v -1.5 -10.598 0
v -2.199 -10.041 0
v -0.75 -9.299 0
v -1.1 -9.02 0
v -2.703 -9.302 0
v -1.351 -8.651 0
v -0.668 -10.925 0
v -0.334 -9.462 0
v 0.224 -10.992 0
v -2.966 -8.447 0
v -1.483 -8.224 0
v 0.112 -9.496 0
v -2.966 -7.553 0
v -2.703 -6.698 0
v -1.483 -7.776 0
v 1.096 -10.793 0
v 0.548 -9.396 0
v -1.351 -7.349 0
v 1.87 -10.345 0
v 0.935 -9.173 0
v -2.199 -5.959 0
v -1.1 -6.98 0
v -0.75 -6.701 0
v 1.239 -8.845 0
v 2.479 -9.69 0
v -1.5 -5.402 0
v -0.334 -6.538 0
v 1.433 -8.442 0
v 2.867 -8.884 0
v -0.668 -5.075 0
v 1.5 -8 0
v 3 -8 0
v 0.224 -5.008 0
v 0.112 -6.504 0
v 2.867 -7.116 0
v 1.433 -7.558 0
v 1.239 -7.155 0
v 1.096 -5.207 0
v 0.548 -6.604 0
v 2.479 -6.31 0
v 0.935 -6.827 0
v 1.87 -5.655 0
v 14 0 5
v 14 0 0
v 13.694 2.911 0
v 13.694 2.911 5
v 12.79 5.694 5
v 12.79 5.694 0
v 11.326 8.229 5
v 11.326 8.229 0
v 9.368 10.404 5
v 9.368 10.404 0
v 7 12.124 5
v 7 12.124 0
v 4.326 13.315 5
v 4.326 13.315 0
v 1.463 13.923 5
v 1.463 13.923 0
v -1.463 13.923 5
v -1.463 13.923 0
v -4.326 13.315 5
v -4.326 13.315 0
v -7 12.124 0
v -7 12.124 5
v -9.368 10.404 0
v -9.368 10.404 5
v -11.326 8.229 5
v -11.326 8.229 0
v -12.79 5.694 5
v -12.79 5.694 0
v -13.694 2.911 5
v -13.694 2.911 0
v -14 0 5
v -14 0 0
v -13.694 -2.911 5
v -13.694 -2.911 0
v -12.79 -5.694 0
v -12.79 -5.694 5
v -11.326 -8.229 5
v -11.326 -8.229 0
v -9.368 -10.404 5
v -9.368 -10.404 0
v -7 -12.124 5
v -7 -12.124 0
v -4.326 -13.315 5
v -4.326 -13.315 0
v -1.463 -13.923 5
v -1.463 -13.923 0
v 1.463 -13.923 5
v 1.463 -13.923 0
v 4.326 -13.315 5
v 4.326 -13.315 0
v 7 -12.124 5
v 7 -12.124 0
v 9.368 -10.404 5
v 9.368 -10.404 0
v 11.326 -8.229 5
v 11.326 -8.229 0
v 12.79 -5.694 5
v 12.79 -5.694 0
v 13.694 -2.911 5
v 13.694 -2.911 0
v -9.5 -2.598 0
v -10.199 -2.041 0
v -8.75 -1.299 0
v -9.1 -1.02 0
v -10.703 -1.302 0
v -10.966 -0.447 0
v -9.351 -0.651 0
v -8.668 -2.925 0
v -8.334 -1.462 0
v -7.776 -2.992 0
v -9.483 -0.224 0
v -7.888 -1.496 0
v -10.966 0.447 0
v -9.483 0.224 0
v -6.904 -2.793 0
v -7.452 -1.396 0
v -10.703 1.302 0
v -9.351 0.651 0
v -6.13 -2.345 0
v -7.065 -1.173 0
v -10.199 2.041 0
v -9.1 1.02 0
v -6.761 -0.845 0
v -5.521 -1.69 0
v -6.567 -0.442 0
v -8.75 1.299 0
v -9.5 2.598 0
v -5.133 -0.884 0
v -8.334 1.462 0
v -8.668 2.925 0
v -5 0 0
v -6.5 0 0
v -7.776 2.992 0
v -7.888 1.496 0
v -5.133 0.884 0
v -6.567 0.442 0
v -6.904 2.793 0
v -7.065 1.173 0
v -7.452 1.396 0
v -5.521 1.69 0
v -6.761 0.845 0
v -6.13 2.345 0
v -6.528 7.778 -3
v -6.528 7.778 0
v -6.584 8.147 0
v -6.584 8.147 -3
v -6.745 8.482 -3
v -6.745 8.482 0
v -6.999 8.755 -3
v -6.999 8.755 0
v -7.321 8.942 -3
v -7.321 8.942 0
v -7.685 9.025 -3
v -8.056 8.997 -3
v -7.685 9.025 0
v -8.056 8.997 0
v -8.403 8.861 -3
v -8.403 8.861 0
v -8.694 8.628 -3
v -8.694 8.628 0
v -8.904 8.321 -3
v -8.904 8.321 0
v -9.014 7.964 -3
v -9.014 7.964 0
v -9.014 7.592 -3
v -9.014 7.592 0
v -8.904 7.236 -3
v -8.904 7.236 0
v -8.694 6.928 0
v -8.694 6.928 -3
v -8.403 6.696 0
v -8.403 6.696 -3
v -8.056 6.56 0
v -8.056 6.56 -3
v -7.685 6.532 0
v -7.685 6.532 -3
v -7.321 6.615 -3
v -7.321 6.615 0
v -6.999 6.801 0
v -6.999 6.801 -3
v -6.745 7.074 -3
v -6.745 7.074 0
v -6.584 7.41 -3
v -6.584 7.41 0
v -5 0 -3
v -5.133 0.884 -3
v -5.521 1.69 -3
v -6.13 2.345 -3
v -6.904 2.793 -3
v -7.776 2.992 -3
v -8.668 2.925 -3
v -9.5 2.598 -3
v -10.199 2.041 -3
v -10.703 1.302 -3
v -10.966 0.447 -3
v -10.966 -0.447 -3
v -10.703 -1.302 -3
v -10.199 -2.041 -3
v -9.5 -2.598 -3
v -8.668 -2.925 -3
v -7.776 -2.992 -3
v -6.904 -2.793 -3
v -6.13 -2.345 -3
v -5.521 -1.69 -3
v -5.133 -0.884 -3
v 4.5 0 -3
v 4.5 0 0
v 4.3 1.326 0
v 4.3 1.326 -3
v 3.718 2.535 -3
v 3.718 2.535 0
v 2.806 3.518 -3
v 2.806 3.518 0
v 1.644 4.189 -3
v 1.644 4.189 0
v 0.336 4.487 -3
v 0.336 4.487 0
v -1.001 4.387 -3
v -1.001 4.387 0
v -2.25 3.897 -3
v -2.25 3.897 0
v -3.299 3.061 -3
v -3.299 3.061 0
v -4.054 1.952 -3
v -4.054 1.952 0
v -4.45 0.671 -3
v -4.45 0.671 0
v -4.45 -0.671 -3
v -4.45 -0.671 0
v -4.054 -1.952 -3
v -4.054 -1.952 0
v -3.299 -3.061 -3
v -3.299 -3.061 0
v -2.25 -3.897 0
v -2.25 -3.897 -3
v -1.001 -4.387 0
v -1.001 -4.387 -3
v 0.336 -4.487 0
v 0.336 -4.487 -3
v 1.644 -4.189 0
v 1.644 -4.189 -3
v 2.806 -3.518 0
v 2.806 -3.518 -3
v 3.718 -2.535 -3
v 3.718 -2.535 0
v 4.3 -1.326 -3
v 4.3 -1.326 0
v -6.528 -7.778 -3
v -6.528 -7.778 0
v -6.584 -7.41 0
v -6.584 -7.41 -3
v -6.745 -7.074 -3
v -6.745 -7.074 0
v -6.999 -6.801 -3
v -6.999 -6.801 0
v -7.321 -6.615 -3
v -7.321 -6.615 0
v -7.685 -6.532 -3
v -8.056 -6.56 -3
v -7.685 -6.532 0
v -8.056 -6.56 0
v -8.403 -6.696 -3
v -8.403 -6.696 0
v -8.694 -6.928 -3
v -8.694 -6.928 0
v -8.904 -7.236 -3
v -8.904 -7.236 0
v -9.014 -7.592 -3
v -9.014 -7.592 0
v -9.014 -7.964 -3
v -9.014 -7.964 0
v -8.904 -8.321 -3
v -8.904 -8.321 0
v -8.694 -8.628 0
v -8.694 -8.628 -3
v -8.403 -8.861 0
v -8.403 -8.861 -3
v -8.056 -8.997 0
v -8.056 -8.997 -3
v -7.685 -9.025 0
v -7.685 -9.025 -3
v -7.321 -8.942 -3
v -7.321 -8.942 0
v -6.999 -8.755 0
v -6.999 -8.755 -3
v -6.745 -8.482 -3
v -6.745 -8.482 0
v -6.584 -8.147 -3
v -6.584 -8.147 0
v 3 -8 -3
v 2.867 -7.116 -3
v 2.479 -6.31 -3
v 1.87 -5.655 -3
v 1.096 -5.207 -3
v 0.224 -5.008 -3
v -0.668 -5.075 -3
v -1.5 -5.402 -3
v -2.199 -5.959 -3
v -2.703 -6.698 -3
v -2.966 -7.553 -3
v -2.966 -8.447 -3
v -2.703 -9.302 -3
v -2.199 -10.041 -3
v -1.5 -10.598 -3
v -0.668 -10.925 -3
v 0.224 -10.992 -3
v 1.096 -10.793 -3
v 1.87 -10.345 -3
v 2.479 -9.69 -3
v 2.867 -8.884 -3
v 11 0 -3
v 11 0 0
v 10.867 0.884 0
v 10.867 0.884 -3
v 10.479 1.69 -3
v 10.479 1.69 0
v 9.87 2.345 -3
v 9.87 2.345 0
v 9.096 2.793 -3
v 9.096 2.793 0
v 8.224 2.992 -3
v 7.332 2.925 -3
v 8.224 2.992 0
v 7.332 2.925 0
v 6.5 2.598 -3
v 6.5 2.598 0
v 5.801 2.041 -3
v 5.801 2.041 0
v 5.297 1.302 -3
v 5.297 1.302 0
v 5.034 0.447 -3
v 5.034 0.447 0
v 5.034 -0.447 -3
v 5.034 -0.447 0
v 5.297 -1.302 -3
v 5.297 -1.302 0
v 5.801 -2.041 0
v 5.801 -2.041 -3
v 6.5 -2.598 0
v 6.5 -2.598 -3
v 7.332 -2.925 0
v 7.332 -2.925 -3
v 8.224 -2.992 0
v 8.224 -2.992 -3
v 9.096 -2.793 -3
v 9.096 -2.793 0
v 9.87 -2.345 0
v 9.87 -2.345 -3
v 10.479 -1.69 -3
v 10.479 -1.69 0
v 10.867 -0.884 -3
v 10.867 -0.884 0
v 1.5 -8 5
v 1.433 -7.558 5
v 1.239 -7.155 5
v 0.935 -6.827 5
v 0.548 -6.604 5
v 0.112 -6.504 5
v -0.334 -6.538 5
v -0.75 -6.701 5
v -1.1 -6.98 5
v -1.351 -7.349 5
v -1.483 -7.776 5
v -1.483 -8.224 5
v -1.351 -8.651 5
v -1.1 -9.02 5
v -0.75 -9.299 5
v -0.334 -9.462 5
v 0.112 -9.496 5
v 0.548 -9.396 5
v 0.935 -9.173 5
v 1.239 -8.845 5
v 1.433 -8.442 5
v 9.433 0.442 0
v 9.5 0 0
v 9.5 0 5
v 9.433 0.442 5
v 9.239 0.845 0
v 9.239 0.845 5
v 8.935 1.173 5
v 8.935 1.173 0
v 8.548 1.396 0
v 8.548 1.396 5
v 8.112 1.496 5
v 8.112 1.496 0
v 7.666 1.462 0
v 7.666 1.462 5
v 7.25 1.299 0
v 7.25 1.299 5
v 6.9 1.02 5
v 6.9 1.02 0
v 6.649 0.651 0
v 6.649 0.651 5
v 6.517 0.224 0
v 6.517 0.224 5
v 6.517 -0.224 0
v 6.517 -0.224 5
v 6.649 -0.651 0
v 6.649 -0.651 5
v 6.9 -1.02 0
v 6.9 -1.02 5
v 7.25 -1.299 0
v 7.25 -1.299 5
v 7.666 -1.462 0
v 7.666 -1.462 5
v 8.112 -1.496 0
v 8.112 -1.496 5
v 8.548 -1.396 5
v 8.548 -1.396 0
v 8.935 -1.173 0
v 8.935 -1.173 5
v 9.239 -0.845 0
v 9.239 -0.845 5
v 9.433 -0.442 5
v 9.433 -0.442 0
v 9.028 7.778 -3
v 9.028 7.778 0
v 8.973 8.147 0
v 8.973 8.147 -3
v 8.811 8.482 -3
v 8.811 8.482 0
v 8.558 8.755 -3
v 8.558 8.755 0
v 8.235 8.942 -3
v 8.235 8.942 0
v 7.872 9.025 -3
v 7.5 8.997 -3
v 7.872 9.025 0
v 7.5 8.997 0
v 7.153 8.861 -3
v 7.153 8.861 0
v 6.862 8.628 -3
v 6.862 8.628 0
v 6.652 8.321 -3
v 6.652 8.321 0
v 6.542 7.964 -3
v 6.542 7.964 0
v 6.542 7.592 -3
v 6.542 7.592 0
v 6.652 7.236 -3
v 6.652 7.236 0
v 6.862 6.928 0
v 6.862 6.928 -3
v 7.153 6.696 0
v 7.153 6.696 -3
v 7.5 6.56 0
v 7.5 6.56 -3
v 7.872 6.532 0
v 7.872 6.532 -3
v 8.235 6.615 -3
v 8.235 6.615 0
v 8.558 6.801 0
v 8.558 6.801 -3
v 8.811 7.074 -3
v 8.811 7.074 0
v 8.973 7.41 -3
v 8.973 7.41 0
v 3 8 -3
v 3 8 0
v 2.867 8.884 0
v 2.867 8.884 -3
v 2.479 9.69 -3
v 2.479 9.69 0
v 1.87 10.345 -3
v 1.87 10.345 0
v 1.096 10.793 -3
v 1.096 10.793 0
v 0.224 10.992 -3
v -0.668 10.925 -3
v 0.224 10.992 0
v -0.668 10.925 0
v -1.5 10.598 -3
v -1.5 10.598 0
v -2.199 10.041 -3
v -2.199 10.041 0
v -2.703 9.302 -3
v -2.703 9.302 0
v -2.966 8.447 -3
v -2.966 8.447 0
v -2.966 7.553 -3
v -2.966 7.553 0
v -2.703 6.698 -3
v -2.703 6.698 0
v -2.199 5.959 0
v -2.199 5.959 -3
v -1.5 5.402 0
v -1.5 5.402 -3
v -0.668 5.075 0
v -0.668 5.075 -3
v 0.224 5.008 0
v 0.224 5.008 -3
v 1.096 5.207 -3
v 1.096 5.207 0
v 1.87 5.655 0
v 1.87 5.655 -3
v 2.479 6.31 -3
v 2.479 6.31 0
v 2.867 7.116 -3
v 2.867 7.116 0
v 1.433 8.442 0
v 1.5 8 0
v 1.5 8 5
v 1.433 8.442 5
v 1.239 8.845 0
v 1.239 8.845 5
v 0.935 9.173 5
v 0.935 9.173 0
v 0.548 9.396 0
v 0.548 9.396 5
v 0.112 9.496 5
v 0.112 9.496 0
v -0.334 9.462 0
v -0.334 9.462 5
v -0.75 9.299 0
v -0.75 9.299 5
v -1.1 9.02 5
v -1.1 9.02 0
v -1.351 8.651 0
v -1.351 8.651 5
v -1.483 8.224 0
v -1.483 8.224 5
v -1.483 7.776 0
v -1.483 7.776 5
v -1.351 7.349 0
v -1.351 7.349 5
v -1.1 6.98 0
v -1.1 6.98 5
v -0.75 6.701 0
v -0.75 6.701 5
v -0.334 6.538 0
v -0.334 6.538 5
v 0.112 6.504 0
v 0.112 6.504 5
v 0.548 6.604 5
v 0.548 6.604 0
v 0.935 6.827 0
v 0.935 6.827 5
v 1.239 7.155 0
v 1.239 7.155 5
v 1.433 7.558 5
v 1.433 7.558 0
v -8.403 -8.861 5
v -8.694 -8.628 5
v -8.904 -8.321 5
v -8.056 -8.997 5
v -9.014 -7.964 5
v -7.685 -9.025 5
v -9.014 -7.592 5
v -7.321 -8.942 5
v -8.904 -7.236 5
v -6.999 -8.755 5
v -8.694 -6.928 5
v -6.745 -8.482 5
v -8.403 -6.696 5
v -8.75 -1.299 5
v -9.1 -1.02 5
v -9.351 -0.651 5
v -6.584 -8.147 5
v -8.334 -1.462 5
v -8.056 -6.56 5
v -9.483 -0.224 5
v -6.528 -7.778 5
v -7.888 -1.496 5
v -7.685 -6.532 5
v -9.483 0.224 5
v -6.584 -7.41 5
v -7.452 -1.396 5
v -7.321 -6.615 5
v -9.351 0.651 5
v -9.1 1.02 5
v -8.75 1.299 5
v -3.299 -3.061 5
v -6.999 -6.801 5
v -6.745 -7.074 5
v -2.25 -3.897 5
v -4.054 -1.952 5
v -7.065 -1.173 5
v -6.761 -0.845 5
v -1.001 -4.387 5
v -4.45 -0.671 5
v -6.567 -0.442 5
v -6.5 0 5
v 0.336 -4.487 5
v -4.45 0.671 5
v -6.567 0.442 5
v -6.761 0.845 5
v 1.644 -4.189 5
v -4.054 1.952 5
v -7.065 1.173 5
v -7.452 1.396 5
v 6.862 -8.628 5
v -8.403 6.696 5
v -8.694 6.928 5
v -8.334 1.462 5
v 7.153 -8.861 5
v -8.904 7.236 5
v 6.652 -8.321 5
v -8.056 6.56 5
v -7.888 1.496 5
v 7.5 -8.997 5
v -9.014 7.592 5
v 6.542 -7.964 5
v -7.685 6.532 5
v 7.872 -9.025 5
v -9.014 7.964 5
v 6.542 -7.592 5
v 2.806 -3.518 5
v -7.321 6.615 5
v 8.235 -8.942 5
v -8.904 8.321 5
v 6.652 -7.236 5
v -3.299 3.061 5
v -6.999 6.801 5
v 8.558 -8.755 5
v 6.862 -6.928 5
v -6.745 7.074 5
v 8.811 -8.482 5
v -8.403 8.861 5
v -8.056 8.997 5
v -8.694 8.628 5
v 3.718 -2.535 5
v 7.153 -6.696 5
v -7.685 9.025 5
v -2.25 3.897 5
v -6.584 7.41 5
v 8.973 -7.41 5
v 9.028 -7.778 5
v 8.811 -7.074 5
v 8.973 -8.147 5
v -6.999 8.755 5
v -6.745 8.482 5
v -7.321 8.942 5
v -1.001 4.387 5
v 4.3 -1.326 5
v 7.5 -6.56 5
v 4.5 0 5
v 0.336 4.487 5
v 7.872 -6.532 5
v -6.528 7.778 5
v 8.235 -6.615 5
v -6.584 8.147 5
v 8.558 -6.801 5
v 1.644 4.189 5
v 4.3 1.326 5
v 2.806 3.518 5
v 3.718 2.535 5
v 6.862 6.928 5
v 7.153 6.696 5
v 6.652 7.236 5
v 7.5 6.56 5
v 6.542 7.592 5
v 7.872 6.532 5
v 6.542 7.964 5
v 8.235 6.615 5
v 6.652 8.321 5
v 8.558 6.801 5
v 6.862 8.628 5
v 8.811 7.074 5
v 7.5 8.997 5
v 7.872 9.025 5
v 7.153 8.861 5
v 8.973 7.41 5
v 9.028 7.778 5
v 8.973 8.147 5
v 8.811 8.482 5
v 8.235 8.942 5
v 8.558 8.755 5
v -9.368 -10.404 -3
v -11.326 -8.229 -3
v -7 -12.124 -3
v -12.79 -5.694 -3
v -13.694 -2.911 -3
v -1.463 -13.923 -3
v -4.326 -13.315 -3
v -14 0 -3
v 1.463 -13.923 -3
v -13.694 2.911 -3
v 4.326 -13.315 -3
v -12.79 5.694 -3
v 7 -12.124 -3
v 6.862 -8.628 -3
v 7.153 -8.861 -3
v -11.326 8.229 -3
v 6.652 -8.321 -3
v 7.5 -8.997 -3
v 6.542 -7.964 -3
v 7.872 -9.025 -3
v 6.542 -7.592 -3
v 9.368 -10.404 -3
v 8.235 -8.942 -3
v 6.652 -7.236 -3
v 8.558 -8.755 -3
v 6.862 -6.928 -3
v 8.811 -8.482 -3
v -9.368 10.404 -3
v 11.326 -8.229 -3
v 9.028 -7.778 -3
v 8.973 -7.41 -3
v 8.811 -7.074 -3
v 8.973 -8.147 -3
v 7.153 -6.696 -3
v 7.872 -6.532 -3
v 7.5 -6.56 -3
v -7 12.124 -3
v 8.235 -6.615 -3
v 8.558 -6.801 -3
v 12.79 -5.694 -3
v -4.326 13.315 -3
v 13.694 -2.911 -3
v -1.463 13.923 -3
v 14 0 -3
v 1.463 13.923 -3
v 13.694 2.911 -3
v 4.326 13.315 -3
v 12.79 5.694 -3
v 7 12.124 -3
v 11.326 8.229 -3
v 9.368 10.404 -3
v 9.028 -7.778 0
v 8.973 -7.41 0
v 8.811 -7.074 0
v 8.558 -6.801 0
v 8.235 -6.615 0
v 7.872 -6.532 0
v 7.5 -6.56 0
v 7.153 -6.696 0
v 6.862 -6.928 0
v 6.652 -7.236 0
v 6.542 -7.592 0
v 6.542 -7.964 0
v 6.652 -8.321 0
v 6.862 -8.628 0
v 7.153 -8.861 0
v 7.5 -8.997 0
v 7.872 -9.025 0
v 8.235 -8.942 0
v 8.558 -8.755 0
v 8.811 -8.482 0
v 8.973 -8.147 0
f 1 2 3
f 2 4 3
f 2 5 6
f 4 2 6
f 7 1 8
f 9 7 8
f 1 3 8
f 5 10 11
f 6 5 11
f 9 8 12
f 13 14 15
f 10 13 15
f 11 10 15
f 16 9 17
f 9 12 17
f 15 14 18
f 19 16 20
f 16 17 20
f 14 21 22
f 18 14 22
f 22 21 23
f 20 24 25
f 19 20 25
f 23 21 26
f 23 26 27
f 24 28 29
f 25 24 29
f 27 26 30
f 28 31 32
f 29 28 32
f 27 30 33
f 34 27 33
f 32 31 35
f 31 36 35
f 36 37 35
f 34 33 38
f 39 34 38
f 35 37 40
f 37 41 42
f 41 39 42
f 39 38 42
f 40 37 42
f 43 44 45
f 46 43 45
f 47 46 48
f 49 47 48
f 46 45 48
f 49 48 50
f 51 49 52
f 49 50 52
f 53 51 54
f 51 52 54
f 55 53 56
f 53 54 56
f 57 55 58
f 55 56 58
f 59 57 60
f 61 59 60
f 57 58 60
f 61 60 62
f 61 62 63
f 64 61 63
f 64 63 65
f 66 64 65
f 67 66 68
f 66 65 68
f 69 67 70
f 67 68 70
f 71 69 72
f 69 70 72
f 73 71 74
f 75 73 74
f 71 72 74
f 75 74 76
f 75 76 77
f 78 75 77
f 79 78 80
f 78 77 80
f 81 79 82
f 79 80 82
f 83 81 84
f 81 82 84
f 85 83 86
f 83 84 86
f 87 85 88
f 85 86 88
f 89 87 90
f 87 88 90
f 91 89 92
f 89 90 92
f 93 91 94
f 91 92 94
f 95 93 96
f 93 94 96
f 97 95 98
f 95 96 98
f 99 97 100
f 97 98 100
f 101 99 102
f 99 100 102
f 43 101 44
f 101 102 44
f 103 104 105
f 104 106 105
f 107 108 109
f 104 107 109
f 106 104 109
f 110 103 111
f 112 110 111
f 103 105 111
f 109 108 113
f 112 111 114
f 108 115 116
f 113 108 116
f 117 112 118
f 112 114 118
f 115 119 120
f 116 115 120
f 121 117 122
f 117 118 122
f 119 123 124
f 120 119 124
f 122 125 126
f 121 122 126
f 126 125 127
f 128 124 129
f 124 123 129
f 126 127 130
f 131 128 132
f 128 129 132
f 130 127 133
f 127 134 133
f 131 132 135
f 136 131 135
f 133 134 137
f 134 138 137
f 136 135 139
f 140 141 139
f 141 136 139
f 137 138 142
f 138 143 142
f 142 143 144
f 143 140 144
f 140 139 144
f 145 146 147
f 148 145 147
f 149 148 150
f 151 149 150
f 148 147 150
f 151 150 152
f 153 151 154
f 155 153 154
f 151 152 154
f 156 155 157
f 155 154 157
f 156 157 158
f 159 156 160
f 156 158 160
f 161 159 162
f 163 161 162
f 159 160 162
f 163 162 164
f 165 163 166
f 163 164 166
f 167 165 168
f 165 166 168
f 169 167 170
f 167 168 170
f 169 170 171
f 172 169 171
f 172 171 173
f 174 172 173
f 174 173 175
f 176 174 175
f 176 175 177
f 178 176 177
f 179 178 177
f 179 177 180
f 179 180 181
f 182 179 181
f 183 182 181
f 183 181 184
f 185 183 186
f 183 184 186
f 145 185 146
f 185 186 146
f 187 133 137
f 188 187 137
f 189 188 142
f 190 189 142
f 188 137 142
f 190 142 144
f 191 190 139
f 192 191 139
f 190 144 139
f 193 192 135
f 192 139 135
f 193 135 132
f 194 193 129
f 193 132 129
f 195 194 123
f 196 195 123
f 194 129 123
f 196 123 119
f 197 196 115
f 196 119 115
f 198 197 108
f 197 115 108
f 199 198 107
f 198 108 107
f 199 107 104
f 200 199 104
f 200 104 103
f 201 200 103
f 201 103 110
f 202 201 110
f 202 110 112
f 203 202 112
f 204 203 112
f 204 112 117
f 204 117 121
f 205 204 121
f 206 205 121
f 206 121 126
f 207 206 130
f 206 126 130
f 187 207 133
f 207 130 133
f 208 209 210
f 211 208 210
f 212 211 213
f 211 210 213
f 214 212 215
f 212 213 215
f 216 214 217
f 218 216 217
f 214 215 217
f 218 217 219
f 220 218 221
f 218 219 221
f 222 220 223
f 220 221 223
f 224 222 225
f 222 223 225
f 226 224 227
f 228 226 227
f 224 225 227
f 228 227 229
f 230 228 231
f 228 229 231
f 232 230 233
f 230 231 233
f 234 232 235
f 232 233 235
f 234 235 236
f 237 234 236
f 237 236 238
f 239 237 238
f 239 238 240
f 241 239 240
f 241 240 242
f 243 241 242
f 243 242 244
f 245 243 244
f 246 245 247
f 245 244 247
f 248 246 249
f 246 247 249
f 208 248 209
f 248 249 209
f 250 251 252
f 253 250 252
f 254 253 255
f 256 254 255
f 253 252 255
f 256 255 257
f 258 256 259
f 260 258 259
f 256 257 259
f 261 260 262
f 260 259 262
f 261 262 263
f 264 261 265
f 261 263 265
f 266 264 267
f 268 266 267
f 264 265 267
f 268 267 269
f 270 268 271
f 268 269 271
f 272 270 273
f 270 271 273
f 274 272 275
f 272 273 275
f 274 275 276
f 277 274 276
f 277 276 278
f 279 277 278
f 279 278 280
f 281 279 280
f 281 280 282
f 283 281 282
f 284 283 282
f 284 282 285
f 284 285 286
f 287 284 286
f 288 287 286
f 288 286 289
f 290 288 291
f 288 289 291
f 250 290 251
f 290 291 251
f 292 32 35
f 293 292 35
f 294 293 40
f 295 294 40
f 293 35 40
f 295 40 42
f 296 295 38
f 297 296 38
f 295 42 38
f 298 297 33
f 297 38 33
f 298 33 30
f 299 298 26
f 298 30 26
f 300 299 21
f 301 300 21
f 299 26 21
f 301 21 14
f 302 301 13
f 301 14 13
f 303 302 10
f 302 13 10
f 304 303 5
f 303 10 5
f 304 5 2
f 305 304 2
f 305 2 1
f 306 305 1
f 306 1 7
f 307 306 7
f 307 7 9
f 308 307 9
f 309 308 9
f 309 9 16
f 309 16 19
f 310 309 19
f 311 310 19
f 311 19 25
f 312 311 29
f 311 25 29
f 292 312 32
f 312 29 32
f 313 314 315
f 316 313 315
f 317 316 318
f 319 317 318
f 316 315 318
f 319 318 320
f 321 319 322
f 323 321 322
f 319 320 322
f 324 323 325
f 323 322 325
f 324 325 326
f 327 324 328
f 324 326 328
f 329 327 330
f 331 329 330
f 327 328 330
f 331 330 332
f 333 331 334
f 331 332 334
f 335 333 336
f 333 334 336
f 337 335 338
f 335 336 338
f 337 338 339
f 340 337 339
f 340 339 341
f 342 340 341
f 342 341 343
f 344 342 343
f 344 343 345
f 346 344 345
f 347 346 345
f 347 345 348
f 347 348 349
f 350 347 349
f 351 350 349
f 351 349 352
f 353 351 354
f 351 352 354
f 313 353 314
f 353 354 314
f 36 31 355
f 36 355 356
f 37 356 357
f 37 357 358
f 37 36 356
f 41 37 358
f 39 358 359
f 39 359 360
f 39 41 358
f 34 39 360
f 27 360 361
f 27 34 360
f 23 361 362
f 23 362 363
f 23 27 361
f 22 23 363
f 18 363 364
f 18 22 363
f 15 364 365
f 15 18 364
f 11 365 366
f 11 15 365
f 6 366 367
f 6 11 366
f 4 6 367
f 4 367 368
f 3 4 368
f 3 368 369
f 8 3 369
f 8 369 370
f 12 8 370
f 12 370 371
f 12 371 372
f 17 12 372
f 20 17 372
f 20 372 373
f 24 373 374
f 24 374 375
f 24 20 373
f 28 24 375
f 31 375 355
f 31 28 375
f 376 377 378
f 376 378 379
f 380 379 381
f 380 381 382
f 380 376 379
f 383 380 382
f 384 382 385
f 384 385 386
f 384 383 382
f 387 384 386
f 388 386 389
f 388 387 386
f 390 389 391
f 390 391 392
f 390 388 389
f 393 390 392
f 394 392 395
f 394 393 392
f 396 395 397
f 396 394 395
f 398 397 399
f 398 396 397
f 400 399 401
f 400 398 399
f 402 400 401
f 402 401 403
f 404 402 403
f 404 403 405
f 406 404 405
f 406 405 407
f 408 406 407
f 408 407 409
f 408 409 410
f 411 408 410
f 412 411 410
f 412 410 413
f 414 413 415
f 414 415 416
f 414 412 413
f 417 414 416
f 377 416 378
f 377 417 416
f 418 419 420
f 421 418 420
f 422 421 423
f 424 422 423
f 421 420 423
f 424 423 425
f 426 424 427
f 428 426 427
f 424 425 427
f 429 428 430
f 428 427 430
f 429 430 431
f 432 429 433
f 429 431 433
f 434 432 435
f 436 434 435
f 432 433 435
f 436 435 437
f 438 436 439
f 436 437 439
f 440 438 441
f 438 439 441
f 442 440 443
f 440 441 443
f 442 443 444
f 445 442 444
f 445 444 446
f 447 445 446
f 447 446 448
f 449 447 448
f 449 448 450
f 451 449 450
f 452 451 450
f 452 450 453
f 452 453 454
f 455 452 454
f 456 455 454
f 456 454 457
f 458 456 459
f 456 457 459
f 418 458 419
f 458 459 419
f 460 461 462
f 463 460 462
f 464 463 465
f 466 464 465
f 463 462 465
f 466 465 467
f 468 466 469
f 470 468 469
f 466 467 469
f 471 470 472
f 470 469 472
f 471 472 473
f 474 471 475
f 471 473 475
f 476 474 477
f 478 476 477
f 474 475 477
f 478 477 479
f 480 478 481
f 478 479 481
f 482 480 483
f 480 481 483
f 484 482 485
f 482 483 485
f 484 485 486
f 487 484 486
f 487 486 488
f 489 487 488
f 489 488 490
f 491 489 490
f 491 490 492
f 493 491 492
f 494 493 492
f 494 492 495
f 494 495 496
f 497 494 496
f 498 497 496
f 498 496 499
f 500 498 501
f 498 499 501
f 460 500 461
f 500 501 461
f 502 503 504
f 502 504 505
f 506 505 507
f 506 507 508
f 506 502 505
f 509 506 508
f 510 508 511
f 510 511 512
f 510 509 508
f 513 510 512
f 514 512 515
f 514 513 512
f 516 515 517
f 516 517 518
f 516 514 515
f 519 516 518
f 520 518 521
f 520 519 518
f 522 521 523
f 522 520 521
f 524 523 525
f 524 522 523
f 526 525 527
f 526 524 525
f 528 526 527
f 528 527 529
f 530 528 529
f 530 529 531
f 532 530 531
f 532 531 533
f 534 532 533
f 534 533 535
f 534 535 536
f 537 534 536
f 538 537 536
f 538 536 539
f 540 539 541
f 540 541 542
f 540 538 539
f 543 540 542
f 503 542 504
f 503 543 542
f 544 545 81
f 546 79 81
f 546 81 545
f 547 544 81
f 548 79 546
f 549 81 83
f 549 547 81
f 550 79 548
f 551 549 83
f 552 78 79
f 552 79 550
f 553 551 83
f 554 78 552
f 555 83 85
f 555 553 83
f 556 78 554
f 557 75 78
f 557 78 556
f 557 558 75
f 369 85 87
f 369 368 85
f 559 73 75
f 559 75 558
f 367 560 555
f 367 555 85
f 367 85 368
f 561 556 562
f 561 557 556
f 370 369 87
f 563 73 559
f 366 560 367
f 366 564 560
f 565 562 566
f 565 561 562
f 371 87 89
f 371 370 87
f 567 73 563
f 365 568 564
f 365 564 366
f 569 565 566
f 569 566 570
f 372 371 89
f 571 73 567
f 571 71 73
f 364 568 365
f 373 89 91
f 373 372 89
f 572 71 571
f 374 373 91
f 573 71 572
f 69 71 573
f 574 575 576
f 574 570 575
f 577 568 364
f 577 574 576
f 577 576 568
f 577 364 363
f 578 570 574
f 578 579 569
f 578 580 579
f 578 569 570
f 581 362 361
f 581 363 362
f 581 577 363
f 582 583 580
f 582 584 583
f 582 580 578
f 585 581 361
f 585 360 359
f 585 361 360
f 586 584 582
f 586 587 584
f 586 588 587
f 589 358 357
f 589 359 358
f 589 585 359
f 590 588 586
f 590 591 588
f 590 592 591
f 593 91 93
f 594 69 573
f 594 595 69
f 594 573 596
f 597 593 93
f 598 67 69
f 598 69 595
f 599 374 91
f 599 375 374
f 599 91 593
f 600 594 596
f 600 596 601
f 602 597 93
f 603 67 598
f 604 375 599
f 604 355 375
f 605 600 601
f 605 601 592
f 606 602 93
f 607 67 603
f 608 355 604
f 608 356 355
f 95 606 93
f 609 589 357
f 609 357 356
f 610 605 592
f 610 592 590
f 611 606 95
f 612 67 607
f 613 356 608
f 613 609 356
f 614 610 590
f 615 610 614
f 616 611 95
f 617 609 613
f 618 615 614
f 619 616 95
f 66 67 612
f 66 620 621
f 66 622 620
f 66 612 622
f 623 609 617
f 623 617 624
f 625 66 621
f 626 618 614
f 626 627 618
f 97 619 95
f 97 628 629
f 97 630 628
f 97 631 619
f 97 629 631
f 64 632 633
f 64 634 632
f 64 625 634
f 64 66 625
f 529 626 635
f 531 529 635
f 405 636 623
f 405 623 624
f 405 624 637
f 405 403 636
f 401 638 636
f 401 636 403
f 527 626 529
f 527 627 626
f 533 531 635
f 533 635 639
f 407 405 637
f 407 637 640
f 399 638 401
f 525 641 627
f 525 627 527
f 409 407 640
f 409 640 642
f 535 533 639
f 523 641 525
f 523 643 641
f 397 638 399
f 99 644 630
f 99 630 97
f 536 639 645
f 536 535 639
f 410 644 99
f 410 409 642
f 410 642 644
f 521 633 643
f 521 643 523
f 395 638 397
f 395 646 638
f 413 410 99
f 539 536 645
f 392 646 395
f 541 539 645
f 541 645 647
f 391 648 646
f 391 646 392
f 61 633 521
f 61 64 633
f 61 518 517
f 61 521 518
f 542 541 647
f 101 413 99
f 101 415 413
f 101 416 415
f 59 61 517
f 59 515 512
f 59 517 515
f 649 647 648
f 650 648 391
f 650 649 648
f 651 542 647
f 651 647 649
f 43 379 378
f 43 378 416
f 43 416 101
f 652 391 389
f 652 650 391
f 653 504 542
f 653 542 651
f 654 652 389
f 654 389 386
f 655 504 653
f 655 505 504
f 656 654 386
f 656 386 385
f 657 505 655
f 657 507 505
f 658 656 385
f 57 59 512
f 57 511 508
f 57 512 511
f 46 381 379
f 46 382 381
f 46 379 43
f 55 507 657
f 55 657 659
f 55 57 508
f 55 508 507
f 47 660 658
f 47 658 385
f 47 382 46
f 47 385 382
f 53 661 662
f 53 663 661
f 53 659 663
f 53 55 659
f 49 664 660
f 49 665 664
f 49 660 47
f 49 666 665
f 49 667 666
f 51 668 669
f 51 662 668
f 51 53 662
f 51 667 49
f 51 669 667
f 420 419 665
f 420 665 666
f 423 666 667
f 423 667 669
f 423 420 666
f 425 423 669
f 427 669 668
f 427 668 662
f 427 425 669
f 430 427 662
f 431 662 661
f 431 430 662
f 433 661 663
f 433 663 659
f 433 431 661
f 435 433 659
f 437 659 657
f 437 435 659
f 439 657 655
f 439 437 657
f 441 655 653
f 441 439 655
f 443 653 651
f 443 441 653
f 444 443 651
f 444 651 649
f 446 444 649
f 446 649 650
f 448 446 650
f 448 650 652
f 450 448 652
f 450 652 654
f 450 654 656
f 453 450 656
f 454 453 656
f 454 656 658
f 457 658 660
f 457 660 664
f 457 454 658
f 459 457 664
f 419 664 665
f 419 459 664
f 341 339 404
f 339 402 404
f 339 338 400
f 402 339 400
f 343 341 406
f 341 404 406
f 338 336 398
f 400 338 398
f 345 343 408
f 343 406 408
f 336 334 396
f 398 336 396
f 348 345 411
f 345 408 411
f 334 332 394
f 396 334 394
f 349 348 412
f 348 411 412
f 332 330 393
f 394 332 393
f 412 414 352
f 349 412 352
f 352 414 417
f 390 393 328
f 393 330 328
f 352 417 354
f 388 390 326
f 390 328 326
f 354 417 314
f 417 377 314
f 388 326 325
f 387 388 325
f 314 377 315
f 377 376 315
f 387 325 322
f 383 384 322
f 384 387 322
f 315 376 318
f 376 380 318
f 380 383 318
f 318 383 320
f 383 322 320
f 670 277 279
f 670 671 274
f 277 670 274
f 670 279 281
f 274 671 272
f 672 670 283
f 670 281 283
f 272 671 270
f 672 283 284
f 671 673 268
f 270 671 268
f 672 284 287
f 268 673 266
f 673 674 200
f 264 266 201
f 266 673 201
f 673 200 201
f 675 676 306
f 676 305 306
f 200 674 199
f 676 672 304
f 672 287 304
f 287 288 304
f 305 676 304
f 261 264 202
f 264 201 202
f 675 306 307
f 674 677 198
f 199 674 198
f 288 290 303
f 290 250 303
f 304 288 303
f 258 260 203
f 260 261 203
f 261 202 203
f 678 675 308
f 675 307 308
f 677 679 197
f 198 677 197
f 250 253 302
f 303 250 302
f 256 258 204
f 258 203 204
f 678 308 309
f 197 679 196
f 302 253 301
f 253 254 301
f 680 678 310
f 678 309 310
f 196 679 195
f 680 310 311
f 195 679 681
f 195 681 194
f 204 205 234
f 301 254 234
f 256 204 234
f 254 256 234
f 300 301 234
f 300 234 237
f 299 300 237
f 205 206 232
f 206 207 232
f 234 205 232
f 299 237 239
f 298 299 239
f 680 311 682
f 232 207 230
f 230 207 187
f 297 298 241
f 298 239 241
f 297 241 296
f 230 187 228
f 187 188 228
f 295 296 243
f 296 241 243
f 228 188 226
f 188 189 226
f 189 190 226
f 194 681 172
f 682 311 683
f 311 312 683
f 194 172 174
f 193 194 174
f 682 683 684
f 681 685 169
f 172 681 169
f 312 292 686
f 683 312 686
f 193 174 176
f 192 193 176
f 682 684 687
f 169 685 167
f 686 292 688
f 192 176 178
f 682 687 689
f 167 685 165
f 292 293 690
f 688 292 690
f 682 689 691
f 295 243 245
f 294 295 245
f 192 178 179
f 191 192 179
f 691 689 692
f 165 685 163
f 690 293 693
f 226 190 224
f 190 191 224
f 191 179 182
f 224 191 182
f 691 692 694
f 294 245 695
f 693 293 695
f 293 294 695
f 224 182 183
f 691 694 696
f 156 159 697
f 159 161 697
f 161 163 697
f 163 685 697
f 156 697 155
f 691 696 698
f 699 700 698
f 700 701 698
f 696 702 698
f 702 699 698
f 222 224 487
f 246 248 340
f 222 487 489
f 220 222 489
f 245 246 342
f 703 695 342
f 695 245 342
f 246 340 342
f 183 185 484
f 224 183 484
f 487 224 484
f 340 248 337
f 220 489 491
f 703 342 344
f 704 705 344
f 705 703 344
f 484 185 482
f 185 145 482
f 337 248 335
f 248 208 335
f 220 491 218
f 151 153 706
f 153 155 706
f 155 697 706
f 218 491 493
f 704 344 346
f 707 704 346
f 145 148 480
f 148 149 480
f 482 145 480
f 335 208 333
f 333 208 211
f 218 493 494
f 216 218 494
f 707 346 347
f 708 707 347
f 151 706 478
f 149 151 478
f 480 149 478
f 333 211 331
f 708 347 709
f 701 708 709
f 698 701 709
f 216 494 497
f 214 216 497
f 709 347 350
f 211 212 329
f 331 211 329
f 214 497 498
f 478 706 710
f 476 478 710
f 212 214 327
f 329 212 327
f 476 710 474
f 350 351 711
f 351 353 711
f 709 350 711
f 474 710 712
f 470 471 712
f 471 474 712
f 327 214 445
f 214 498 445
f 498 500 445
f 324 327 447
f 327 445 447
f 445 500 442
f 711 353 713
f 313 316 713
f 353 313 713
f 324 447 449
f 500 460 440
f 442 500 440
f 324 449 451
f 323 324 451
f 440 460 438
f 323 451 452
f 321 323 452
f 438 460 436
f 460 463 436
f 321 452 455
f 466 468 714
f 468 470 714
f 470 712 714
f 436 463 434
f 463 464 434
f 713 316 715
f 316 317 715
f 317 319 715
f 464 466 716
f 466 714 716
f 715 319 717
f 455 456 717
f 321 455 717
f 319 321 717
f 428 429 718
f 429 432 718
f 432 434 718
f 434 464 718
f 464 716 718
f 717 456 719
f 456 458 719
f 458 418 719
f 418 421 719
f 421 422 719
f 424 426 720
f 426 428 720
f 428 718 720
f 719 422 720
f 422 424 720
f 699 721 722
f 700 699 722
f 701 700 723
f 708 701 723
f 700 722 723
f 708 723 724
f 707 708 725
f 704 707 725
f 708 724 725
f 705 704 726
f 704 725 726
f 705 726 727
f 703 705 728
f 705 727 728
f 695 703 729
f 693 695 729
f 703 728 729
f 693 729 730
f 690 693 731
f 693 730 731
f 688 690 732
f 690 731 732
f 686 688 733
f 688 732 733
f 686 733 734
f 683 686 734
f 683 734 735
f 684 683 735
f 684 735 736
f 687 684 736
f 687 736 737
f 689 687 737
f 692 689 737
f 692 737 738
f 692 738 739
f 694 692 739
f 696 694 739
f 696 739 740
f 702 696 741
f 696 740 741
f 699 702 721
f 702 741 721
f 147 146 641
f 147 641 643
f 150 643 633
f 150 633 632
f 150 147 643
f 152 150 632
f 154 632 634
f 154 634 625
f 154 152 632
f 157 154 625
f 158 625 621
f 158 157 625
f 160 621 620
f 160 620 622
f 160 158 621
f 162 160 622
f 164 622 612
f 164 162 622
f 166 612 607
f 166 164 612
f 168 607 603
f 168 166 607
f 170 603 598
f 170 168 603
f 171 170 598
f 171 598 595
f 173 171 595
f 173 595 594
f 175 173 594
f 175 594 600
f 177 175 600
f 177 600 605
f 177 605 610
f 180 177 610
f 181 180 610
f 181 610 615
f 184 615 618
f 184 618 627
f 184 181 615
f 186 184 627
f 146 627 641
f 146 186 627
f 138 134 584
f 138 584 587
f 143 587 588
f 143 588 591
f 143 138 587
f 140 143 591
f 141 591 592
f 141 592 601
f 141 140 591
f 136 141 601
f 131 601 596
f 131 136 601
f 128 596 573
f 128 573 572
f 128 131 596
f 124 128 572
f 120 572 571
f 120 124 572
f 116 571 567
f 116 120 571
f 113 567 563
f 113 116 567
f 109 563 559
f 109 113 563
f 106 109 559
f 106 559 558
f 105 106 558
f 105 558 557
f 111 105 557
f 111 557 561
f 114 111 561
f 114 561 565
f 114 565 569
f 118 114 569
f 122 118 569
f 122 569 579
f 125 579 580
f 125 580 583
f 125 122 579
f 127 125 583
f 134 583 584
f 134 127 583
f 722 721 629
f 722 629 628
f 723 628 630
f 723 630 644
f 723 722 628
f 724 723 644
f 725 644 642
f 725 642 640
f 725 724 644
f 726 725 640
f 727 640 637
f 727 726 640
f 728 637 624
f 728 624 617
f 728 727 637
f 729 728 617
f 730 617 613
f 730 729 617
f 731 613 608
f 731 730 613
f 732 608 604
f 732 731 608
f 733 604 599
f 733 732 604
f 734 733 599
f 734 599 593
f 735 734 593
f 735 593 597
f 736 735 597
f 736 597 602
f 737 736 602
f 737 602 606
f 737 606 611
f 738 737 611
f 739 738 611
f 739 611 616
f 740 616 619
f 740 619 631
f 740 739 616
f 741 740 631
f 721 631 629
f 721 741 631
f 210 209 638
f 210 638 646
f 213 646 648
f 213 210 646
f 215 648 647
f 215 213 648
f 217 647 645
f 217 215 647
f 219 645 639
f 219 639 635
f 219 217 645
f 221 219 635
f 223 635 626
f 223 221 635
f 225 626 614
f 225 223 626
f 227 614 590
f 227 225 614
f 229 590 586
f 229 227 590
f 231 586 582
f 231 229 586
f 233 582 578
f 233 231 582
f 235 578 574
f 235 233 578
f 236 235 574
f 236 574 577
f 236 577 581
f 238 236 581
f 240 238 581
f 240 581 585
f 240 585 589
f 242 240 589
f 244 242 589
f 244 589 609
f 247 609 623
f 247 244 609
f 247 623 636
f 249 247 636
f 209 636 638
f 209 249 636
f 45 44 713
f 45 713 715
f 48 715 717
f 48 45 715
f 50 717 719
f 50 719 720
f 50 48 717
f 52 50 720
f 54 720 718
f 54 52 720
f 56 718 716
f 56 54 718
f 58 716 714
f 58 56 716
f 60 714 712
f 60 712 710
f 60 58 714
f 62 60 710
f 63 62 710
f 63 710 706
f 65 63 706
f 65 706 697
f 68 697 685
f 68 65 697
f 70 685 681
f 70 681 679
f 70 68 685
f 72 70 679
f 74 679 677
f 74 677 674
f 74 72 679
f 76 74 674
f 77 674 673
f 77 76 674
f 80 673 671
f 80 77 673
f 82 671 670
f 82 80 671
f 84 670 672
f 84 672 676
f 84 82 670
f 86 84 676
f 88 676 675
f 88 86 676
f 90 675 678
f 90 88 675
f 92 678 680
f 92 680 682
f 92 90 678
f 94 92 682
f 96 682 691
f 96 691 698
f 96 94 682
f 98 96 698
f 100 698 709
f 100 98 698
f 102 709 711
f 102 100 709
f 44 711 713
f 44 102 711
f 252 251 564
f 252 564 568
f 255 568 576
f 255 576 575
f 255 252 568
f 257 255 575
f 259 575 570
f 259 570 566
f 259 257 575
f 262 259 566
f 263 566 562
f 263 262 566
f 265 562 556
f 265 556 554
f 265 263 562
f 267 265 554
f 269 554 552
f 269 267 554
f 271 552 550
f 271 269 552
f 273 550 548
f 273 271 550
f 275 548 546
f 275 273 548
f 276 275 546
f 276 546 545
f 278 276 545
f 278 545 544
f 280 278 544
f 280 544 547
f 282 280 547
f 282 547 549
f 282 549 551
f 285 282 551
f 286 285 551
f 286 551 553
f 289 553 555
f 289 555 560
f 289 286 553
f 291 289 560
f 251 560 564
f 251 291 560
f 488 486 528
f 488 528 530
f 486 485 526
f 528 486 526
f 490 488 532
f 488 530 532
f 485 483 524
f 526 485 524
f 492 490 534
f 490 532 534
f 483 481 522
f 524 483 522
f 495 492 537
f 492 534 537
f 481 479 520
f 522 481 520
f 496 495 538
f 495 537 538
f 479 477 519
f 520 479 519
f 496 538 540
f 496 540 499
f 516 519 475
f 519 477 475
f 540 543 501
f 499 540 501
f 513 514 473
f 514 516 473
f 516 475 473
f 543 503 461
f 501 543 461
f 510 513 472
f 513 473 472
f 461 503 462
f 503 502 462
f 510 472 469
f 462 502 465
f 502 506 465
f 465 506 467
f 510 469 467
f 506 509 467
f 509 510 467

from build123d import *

# Parameters (mm, degrees)
F0_R     = 14
F0_R_2   = 1.25
F0_R_3   = 3
F0_R_4   = 4.5
F1_DEPTH = 3
F0_R_5   = 1.5
F2_DEPTH = 5


with BuildPart() as f1:
    # F0 (on Top) → F1 (new body)
    with BuildSketch(Plane.XY):
        Circle(F0_R)
        with Locations((-7.7781745931, -7.7781745931)):
            Circle(F0_R_2, mode=Mode.SUBTRACT)
        with Locations((0, -8)):
            Circle(F0_R_3, mode=Mode.SUBTRACT)
        with Locations((7.7781745931, -7.7781745931)):
            Circle(F0_R_2, mode=Mode.SUBTRACT)
        with Locations((-8, 0)):
            Circle(F0_R_3, mode=Mode.SUBTRACT)
        with Locations((-7.7781745931, 7.7781745931)):
            Circle(F0_R_2, mode=Mode.SUBTRACT)
        Circle(F0_R_4, mode=Mode.SUBTRACT)
        with Locations((8, 0)):
            Circle(F0_R_3, mode=Mode.SUBTRACT)
        with Locations((0, 8)):
            Circle(F0_R_3, mode=Mode.SUBTRACT)
        with Locations((7.7781745931, 7.7781745931)):
            Circle(F0_R_2, mode=Mode.SUBTRACT)
    extrude(amount=-F1_DEPTH)

    # F0 (on Top) → F2 (join)
    with BuildSketch(Plane.XY):
        Circle(F0_R)
        with Locations((-7.7781745931, -7.7781745931)):
            Circle(F0_R_2, mode=Mode.SUBTRACT)
        with Locations((0, -8)):
            Circle(F0_R_3, mode=Mode.SUBTRACT)
        with Locations((7.7781745931, -7.7781745931)):
            Circle(F0_R_2, mode=Mode.SUBTRACT)
        with Locations((-8, 0)):
            Circle(F0_R_3, mode=Mode.SUBTRACT)
        with Locations((-7.7781745931, 7.7781745931)):
            Circle(F0_R_2, mode=Mode.SUBTRACT)
        Circle(F0_R_4, mode=Mode.SUBTRACT)
        with Locations((8, 0)):
            Circle(F0_R_3, mode=Mode.SUBTRACT)
        with Locations((0, 8)):
            Circle(F0_R_3, mode=Mode.SUBTRACT)
        with Locations((7.7781745931, 7.7781745931)):
            Circle(F0_R_2, mode=Mode.SUBTRACT)
        with Locations((-8, 0)):
            Circle(F0_R_3)
        with Locations((-8, 0)):
            Circle(F0_R_5, mode=Mode.SUBTRACT)
        with Locations((0, 8)):
            Circle(F0_R_3)
        with Locations((0, 8)):
            Circle(F0_R_5, mode=Mode.SUBTRACT)
        with Locations((8, 0)):
            Circle(F0_R_3)
        with Locations((8, 0)):
            Circle(F0_R_5, mode=Mode.SUBTRACT)
        with Locations((0, -8)):
            Circle(F0_R_3)
        with Locations((0, -8)):
            Circle(F0_R_5, mode=Mode.SUBTRACT)
    extrude(amount=F2_DEPTH)


solid = f1.part
